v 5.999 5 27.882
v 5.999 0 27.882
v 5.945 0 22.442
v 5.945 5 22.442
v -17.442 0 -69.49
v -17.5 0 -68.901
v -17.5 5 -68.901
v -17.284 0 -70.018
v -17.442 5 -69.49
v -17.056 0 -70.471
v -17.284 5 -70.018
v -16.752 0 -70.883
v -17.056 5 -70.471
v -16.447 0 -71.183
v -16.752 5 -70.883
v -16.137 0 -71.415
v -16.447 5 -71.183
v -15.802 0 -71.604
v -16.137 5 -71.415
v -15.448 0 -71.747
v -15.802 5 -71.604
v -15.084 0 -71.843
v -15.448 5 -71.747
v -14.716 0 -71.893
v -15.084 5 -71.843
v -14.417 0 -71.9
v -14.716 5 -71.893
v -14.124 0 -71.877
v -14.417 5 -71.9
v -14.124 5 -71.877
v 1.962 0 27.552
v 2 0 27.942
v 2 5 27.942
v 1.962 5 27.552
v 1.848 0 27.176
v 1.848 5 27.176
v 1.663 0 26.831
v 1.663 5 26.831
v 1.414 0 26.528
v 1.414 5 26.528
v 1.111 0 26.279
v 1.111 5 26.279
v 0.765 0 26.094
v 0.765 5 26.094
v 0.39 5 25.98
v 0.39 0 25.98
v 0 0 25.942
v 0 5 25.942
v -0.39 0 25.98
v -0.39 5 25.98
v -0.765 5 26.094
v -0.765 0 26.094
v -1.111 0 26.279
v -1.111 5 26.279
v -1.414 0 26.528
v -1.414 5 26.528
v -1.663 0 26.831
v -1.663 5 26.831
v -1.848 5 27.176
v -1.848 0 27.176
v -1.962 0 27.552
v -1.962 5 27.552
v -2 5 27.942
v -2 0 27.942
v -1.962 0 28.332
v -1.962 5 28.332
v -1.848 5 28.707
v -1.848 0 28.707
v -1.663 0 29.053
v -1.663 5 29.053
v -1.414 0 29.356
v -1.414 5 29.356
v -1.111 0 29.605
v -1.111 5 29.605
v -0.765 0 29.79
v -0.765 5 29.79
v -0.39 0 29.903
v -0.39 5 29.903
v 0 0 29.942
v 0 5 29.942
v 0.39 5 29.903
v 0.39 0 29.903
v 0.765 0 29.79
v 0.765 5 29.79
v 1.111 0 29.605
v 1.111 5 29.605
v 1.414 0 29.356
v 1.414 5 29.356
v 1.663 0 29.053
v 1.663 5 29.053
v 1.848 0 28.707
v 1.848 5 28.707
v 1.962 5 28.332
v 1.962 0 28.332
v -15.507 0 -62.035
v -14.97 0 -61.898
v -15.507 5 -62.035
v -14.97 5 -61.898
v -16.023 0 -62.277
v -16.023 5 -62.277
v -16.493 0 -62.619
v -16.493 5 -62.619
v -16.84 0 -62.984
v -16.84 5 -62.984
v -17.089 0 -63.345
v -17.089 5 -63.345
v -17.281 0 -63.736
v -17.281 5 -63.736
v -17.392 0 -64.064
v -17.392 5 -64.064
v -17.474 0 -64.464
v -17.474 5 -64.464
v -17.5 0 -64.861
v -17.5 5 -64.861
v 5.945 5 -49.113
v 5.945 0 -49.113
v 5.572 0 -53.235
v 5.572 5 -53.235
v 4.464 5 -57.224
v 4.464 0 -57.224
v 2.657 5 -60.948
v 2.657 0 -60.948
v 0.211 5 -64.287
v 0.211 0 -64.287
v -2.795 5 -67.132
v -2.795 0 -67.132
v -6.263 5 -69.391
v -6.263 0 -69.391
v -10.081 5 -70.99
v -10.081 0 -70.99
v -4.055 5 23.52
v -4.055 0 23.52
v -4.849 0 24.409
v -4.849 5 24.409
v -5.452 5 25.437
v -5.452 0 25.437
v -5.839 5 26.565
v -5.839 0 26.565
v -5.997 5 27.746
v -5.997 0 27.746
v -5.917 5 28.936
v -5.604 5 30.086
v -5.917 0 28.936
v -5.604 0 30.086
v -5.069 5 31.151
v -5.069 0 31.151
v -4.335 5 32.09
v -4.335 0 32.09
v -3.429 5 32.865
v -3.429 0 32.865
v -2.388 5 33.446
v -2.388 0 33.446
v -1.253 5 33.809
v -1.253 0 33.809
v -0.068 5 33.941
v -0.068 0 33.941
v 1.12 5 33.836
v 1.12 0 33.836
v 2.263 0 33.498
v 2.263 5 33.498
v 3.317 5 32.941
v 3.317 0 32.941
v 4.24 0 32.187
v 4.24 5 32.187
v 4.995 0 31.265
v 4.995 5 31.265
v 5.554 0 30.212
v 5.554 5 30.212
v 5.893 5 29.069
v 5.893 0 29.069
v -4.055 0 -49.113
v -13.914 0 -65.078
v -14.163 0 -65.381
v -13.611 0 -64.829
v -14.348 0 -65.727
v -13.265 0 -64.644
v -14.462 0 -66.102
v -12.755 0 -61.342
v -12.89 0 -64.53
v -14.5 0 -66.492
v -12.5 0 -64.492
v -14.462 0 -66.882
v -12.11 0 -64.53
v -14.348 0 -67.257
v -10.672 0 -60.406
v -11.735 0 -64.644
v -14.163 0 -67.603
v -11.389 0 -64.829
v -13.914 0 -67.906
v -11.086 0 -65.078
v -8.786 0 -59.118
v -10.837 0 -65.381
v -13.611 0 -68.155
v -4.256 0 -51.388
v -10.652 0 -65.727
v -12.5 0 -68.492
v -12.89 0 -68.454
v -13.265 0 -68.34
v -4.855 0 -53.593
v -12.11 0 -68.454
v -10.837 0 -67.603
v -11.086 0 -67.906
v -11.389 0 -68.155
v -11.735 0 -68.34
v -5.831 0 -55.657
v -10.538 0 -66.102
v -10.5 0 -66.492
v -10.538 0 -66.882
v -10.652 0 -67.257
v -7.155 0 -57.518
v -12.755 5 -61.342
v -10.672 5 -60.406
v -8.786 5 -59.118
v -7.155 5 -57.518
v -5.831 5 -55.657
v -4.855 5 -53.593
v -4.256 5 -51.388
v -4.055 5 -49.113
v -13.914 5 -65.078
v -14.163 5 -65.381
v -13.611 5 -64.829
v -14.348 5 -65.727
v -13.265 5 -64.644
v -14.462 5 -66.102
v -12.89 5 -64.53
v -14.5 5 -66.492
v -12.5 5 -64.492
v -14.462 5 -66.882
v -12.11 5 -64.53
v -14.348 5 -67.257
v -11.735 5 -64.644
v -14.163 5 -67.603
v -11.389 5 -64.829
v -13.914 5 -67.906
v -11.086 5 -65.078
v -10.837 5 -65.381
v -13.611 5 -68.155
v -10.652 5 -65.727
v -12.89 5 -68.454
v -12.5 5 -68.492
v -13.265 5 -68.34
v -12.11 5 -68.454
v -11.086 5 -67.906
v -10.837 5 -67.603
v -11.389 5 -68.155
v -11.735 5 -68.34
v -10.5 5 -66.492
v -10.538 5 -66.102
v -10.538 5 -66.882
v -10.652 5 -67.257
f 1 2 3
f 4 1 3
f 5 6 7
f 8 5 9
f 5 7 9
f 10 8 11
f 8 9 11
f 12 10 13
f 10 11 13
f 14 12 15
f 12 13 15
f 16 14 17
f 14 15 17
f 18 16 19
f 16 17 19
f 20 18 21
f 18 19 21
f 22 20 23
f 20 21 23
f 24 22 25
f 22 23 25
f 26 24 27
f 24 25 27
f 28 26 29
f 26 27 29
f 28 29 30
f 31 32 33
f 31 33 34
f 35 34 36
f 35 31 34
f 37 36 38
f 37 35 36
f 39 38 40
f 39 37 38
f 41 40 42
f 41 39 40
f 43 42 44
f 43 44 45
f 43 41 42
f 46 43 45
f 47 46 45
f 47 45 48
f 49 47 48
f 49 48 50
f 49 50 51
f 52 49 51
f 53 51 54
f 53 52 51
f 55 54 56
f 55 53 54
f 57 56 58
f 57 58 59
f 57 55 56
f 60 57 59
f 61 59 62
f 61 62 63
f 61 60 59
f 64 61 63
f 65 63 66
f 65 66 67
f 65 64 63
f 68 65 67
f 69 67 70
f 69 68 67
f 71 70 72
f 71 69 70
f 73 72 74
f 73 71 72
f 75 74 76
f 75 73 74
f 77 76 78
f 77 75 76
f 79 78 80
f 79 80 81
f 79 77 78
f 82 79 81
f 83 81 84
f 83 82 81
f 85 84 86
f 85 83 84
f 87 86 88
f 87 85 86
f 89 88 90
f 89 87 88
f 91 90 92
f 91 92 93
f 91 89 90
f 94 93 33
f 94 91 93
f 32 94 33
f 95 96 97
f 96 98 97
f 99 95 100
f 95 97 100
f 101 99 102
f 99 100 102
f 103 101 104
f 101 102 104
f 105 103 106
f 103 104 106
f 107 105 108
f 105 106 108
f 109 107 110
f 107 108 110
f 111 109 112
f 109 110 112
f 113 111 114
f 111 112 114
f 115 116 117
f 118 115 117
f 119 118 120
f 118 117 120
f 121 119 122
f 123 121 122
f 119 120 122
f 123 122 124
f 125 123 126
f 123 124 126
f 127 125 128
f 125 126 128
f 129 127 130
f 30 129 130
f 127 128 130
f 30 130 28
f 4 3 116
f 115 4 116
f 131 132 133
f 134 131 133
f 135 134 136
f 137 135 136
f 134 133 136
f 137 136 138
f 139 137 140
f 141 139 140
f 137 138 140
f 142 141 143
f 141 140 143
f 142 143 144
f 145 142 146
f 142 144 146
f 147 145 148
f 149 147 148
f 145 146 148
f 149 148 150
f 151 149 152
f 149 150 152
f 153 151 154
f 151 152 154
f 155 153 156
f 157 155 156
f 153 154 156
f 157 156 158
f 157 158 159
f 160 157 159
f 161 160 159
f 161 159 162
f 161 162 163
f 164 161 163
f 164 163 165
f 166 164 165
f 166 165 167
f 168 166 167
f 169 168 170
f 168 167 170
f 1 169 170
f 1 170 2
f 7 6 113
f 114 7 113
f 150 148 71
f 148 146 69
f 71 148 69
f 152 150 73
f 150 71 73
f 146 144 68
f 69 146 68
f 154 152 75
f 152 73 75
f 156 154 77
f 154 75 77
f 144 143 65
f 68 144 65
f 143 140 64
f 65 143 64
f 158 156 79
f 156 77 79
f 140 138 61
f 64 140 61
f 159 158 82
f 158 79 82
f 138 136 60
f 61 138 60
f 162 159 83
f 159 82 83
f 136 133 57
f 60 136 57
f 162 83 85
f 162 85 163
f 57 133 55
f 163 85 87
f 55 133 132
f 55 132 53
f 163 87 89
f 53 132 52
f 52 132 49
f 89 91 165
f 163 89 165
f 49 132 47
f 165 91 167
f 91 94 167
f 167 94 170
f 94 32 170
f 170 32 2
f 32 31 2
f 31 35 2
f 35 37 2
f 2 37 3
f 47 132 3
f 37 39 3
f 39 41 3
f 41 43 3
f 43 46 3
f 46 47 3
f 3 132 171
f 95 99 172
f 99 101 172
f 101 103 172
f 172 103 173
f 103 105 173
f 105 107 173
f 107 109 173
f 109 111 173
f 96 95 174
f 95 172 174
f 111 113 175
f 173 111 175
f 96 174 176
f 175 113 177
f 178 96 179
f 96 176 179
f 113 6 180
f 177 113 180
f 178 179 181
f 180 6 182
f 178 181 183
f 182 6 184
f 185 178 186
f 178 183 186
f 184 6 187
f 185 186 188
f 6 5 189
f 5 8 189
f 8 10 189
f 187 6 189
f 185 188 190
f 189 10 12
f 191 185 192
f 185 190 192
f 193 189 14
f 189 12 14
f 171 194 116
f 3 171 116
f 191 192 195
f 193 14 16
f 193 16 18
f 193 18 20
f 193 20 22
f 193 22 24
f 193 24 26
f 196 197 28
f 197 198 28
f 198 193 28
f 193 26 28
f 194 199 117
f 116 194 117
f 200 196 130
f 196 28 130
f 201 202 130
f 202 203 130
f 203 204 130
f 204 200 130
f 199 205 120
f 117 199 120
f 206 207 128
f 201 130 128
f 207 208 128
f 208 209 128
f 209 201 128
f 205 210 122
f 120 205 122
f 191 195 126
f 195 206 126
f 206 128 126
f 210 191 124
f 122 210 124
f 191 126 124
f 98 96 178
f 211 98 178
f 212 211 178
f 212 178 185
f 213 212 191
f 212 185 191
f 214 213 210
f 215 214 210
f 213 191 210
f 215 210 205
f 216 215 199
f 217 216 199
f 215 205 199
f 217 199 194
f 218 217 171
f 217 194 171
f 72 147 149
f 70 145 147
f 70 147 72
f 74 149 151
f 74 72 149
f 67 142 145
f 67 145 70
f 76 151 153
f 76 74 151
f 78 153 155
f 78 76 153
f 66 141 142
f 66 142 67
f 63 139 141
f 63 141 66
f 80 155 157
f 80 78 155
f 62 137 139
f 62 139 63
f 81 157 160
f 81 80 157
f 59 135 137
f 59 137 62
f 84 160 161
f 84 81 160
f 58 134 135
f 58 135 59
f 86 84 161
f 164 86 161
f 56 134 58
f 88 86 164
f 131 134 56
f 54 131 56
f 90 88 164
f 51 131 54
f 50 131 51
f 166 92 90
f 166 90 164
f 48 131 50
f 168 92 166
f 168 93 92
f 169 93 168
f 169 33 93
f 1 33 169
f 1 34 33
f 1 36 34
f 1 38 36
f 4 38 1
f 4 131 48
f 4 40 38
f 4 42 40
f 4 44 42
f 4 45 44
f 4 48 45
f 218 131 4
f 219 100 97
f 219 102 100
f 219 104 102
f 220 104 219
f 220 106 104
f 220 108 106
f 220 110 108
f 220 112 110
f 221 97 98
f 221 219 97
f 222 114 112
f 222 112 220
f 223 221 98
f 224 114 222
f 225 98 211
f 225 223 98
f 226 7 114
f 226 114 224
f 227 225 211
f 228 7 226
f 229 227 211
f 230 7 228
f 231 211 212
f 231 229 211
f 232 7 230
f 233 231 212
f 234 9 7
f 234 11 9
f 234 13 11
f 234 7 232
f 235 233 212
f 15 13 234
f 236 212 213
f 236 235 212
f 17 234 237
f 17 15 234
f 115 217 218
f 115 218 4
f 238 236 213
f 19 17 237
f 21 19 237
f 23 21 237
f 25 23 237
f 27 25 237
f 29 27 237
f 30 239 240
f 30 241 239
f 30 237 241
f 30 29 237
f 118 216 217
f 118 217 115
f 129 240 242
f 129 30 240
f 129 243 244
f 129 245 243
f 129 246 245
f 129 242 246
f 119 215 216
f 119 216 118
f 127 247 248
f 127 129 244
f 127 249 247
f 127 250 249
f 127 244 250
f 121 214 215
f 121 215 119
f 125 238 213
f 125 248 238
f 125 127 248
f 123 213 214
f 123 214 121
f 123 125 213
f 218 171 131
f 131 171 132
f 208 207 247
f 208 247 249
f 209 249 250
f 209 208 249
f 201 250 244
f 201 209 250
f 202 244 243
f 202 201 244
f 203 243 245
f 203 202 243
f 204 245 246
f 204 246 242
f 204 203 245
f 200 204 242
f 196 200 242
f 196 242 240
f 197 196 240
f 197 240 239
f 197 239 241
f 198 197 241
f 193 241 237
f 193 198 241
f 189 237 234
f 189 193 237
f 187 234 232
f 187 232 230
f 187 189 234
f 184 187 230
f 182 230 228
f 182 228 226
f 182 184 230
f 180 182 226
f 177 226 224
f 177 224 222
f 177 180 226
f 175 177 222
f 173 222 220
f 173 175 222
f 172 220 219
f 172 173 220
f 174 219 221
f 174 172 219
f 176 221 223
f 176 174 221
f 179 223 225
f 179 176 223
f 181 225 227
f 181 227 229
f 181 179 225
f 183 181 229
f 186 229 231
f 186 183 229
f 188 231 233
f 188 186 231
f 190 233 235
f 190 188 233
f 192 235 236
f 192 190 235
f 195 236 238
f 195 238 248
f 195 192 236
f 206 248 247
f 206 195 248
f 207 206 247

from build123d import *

# Parameters (mm, degrees)
SKETCH1_R           = 2
BOSS_EXTRUDE1_DEPTH = 5
FILLET1_R           = 3


with BuildPart() as part:
    # Sketch1 → Boss-Extrude1 (new body)
    with BuildSketch(Plane(origin=(0, 0, 0), x_dir=(1, 0, 0), z_dir=(0, 1, 0))):
        with BuildLine():
            Line((-4.055, 49.113152598), (-4.055, -16.120690269))
            Line((-4.055, -16.120690269), (-4.055, -23.51992753))
            ThreePointArc((-4.055, -23.51992753), (-2.3878384, -33.44590301), (5.99940006, -27.881853402))
            Line((5.99940006, -27.881853402), (5.945, -22.441847402))
            Line((5.945, -22.441847402), (5.945, 2.058152598))
            Line((5.945, 2.058152598), (5.945, 49.113152598))
            ThreePointArc((5.945, 49.113152598), (-0.775434906, 65.337717692), (-17, 72.058152598))
            Line((-17, 72.058152598), (-17.5, 72.058152598))
            Line((-17.5, 72.058152598), (-17.5, 62.058152598))
            Line((-17.5, 62.058152598), (-17, 62.058152598))
            ThreePointArc((-17, 62.058152598), (-7.846502718, 58.26664988), (-4.055, 49.113152598))
        make_face()
        with Locations((0, -27.941847402)):
            Circle(SKETCH1_R, mode=Mode.SUBTRACT)
        with Locations((-12.5, 66.491962252)):
            Circle(SKETCH1_R, mode=Mode.SUBTRACT)
    extrude(amount=BOSS_EXTRUDE1_DEPTH)

    # Fillet1
    fillet1_edges = [part.edges().sort_by_distance(p)[0] for p in [
        (-17.5, 2.5, -62.058152598),
        (-17.5, 2.5, -72.058152598),
    ]]
    fillet(fillet1_edges, radius=FILLET1_R)


solid = part.part
